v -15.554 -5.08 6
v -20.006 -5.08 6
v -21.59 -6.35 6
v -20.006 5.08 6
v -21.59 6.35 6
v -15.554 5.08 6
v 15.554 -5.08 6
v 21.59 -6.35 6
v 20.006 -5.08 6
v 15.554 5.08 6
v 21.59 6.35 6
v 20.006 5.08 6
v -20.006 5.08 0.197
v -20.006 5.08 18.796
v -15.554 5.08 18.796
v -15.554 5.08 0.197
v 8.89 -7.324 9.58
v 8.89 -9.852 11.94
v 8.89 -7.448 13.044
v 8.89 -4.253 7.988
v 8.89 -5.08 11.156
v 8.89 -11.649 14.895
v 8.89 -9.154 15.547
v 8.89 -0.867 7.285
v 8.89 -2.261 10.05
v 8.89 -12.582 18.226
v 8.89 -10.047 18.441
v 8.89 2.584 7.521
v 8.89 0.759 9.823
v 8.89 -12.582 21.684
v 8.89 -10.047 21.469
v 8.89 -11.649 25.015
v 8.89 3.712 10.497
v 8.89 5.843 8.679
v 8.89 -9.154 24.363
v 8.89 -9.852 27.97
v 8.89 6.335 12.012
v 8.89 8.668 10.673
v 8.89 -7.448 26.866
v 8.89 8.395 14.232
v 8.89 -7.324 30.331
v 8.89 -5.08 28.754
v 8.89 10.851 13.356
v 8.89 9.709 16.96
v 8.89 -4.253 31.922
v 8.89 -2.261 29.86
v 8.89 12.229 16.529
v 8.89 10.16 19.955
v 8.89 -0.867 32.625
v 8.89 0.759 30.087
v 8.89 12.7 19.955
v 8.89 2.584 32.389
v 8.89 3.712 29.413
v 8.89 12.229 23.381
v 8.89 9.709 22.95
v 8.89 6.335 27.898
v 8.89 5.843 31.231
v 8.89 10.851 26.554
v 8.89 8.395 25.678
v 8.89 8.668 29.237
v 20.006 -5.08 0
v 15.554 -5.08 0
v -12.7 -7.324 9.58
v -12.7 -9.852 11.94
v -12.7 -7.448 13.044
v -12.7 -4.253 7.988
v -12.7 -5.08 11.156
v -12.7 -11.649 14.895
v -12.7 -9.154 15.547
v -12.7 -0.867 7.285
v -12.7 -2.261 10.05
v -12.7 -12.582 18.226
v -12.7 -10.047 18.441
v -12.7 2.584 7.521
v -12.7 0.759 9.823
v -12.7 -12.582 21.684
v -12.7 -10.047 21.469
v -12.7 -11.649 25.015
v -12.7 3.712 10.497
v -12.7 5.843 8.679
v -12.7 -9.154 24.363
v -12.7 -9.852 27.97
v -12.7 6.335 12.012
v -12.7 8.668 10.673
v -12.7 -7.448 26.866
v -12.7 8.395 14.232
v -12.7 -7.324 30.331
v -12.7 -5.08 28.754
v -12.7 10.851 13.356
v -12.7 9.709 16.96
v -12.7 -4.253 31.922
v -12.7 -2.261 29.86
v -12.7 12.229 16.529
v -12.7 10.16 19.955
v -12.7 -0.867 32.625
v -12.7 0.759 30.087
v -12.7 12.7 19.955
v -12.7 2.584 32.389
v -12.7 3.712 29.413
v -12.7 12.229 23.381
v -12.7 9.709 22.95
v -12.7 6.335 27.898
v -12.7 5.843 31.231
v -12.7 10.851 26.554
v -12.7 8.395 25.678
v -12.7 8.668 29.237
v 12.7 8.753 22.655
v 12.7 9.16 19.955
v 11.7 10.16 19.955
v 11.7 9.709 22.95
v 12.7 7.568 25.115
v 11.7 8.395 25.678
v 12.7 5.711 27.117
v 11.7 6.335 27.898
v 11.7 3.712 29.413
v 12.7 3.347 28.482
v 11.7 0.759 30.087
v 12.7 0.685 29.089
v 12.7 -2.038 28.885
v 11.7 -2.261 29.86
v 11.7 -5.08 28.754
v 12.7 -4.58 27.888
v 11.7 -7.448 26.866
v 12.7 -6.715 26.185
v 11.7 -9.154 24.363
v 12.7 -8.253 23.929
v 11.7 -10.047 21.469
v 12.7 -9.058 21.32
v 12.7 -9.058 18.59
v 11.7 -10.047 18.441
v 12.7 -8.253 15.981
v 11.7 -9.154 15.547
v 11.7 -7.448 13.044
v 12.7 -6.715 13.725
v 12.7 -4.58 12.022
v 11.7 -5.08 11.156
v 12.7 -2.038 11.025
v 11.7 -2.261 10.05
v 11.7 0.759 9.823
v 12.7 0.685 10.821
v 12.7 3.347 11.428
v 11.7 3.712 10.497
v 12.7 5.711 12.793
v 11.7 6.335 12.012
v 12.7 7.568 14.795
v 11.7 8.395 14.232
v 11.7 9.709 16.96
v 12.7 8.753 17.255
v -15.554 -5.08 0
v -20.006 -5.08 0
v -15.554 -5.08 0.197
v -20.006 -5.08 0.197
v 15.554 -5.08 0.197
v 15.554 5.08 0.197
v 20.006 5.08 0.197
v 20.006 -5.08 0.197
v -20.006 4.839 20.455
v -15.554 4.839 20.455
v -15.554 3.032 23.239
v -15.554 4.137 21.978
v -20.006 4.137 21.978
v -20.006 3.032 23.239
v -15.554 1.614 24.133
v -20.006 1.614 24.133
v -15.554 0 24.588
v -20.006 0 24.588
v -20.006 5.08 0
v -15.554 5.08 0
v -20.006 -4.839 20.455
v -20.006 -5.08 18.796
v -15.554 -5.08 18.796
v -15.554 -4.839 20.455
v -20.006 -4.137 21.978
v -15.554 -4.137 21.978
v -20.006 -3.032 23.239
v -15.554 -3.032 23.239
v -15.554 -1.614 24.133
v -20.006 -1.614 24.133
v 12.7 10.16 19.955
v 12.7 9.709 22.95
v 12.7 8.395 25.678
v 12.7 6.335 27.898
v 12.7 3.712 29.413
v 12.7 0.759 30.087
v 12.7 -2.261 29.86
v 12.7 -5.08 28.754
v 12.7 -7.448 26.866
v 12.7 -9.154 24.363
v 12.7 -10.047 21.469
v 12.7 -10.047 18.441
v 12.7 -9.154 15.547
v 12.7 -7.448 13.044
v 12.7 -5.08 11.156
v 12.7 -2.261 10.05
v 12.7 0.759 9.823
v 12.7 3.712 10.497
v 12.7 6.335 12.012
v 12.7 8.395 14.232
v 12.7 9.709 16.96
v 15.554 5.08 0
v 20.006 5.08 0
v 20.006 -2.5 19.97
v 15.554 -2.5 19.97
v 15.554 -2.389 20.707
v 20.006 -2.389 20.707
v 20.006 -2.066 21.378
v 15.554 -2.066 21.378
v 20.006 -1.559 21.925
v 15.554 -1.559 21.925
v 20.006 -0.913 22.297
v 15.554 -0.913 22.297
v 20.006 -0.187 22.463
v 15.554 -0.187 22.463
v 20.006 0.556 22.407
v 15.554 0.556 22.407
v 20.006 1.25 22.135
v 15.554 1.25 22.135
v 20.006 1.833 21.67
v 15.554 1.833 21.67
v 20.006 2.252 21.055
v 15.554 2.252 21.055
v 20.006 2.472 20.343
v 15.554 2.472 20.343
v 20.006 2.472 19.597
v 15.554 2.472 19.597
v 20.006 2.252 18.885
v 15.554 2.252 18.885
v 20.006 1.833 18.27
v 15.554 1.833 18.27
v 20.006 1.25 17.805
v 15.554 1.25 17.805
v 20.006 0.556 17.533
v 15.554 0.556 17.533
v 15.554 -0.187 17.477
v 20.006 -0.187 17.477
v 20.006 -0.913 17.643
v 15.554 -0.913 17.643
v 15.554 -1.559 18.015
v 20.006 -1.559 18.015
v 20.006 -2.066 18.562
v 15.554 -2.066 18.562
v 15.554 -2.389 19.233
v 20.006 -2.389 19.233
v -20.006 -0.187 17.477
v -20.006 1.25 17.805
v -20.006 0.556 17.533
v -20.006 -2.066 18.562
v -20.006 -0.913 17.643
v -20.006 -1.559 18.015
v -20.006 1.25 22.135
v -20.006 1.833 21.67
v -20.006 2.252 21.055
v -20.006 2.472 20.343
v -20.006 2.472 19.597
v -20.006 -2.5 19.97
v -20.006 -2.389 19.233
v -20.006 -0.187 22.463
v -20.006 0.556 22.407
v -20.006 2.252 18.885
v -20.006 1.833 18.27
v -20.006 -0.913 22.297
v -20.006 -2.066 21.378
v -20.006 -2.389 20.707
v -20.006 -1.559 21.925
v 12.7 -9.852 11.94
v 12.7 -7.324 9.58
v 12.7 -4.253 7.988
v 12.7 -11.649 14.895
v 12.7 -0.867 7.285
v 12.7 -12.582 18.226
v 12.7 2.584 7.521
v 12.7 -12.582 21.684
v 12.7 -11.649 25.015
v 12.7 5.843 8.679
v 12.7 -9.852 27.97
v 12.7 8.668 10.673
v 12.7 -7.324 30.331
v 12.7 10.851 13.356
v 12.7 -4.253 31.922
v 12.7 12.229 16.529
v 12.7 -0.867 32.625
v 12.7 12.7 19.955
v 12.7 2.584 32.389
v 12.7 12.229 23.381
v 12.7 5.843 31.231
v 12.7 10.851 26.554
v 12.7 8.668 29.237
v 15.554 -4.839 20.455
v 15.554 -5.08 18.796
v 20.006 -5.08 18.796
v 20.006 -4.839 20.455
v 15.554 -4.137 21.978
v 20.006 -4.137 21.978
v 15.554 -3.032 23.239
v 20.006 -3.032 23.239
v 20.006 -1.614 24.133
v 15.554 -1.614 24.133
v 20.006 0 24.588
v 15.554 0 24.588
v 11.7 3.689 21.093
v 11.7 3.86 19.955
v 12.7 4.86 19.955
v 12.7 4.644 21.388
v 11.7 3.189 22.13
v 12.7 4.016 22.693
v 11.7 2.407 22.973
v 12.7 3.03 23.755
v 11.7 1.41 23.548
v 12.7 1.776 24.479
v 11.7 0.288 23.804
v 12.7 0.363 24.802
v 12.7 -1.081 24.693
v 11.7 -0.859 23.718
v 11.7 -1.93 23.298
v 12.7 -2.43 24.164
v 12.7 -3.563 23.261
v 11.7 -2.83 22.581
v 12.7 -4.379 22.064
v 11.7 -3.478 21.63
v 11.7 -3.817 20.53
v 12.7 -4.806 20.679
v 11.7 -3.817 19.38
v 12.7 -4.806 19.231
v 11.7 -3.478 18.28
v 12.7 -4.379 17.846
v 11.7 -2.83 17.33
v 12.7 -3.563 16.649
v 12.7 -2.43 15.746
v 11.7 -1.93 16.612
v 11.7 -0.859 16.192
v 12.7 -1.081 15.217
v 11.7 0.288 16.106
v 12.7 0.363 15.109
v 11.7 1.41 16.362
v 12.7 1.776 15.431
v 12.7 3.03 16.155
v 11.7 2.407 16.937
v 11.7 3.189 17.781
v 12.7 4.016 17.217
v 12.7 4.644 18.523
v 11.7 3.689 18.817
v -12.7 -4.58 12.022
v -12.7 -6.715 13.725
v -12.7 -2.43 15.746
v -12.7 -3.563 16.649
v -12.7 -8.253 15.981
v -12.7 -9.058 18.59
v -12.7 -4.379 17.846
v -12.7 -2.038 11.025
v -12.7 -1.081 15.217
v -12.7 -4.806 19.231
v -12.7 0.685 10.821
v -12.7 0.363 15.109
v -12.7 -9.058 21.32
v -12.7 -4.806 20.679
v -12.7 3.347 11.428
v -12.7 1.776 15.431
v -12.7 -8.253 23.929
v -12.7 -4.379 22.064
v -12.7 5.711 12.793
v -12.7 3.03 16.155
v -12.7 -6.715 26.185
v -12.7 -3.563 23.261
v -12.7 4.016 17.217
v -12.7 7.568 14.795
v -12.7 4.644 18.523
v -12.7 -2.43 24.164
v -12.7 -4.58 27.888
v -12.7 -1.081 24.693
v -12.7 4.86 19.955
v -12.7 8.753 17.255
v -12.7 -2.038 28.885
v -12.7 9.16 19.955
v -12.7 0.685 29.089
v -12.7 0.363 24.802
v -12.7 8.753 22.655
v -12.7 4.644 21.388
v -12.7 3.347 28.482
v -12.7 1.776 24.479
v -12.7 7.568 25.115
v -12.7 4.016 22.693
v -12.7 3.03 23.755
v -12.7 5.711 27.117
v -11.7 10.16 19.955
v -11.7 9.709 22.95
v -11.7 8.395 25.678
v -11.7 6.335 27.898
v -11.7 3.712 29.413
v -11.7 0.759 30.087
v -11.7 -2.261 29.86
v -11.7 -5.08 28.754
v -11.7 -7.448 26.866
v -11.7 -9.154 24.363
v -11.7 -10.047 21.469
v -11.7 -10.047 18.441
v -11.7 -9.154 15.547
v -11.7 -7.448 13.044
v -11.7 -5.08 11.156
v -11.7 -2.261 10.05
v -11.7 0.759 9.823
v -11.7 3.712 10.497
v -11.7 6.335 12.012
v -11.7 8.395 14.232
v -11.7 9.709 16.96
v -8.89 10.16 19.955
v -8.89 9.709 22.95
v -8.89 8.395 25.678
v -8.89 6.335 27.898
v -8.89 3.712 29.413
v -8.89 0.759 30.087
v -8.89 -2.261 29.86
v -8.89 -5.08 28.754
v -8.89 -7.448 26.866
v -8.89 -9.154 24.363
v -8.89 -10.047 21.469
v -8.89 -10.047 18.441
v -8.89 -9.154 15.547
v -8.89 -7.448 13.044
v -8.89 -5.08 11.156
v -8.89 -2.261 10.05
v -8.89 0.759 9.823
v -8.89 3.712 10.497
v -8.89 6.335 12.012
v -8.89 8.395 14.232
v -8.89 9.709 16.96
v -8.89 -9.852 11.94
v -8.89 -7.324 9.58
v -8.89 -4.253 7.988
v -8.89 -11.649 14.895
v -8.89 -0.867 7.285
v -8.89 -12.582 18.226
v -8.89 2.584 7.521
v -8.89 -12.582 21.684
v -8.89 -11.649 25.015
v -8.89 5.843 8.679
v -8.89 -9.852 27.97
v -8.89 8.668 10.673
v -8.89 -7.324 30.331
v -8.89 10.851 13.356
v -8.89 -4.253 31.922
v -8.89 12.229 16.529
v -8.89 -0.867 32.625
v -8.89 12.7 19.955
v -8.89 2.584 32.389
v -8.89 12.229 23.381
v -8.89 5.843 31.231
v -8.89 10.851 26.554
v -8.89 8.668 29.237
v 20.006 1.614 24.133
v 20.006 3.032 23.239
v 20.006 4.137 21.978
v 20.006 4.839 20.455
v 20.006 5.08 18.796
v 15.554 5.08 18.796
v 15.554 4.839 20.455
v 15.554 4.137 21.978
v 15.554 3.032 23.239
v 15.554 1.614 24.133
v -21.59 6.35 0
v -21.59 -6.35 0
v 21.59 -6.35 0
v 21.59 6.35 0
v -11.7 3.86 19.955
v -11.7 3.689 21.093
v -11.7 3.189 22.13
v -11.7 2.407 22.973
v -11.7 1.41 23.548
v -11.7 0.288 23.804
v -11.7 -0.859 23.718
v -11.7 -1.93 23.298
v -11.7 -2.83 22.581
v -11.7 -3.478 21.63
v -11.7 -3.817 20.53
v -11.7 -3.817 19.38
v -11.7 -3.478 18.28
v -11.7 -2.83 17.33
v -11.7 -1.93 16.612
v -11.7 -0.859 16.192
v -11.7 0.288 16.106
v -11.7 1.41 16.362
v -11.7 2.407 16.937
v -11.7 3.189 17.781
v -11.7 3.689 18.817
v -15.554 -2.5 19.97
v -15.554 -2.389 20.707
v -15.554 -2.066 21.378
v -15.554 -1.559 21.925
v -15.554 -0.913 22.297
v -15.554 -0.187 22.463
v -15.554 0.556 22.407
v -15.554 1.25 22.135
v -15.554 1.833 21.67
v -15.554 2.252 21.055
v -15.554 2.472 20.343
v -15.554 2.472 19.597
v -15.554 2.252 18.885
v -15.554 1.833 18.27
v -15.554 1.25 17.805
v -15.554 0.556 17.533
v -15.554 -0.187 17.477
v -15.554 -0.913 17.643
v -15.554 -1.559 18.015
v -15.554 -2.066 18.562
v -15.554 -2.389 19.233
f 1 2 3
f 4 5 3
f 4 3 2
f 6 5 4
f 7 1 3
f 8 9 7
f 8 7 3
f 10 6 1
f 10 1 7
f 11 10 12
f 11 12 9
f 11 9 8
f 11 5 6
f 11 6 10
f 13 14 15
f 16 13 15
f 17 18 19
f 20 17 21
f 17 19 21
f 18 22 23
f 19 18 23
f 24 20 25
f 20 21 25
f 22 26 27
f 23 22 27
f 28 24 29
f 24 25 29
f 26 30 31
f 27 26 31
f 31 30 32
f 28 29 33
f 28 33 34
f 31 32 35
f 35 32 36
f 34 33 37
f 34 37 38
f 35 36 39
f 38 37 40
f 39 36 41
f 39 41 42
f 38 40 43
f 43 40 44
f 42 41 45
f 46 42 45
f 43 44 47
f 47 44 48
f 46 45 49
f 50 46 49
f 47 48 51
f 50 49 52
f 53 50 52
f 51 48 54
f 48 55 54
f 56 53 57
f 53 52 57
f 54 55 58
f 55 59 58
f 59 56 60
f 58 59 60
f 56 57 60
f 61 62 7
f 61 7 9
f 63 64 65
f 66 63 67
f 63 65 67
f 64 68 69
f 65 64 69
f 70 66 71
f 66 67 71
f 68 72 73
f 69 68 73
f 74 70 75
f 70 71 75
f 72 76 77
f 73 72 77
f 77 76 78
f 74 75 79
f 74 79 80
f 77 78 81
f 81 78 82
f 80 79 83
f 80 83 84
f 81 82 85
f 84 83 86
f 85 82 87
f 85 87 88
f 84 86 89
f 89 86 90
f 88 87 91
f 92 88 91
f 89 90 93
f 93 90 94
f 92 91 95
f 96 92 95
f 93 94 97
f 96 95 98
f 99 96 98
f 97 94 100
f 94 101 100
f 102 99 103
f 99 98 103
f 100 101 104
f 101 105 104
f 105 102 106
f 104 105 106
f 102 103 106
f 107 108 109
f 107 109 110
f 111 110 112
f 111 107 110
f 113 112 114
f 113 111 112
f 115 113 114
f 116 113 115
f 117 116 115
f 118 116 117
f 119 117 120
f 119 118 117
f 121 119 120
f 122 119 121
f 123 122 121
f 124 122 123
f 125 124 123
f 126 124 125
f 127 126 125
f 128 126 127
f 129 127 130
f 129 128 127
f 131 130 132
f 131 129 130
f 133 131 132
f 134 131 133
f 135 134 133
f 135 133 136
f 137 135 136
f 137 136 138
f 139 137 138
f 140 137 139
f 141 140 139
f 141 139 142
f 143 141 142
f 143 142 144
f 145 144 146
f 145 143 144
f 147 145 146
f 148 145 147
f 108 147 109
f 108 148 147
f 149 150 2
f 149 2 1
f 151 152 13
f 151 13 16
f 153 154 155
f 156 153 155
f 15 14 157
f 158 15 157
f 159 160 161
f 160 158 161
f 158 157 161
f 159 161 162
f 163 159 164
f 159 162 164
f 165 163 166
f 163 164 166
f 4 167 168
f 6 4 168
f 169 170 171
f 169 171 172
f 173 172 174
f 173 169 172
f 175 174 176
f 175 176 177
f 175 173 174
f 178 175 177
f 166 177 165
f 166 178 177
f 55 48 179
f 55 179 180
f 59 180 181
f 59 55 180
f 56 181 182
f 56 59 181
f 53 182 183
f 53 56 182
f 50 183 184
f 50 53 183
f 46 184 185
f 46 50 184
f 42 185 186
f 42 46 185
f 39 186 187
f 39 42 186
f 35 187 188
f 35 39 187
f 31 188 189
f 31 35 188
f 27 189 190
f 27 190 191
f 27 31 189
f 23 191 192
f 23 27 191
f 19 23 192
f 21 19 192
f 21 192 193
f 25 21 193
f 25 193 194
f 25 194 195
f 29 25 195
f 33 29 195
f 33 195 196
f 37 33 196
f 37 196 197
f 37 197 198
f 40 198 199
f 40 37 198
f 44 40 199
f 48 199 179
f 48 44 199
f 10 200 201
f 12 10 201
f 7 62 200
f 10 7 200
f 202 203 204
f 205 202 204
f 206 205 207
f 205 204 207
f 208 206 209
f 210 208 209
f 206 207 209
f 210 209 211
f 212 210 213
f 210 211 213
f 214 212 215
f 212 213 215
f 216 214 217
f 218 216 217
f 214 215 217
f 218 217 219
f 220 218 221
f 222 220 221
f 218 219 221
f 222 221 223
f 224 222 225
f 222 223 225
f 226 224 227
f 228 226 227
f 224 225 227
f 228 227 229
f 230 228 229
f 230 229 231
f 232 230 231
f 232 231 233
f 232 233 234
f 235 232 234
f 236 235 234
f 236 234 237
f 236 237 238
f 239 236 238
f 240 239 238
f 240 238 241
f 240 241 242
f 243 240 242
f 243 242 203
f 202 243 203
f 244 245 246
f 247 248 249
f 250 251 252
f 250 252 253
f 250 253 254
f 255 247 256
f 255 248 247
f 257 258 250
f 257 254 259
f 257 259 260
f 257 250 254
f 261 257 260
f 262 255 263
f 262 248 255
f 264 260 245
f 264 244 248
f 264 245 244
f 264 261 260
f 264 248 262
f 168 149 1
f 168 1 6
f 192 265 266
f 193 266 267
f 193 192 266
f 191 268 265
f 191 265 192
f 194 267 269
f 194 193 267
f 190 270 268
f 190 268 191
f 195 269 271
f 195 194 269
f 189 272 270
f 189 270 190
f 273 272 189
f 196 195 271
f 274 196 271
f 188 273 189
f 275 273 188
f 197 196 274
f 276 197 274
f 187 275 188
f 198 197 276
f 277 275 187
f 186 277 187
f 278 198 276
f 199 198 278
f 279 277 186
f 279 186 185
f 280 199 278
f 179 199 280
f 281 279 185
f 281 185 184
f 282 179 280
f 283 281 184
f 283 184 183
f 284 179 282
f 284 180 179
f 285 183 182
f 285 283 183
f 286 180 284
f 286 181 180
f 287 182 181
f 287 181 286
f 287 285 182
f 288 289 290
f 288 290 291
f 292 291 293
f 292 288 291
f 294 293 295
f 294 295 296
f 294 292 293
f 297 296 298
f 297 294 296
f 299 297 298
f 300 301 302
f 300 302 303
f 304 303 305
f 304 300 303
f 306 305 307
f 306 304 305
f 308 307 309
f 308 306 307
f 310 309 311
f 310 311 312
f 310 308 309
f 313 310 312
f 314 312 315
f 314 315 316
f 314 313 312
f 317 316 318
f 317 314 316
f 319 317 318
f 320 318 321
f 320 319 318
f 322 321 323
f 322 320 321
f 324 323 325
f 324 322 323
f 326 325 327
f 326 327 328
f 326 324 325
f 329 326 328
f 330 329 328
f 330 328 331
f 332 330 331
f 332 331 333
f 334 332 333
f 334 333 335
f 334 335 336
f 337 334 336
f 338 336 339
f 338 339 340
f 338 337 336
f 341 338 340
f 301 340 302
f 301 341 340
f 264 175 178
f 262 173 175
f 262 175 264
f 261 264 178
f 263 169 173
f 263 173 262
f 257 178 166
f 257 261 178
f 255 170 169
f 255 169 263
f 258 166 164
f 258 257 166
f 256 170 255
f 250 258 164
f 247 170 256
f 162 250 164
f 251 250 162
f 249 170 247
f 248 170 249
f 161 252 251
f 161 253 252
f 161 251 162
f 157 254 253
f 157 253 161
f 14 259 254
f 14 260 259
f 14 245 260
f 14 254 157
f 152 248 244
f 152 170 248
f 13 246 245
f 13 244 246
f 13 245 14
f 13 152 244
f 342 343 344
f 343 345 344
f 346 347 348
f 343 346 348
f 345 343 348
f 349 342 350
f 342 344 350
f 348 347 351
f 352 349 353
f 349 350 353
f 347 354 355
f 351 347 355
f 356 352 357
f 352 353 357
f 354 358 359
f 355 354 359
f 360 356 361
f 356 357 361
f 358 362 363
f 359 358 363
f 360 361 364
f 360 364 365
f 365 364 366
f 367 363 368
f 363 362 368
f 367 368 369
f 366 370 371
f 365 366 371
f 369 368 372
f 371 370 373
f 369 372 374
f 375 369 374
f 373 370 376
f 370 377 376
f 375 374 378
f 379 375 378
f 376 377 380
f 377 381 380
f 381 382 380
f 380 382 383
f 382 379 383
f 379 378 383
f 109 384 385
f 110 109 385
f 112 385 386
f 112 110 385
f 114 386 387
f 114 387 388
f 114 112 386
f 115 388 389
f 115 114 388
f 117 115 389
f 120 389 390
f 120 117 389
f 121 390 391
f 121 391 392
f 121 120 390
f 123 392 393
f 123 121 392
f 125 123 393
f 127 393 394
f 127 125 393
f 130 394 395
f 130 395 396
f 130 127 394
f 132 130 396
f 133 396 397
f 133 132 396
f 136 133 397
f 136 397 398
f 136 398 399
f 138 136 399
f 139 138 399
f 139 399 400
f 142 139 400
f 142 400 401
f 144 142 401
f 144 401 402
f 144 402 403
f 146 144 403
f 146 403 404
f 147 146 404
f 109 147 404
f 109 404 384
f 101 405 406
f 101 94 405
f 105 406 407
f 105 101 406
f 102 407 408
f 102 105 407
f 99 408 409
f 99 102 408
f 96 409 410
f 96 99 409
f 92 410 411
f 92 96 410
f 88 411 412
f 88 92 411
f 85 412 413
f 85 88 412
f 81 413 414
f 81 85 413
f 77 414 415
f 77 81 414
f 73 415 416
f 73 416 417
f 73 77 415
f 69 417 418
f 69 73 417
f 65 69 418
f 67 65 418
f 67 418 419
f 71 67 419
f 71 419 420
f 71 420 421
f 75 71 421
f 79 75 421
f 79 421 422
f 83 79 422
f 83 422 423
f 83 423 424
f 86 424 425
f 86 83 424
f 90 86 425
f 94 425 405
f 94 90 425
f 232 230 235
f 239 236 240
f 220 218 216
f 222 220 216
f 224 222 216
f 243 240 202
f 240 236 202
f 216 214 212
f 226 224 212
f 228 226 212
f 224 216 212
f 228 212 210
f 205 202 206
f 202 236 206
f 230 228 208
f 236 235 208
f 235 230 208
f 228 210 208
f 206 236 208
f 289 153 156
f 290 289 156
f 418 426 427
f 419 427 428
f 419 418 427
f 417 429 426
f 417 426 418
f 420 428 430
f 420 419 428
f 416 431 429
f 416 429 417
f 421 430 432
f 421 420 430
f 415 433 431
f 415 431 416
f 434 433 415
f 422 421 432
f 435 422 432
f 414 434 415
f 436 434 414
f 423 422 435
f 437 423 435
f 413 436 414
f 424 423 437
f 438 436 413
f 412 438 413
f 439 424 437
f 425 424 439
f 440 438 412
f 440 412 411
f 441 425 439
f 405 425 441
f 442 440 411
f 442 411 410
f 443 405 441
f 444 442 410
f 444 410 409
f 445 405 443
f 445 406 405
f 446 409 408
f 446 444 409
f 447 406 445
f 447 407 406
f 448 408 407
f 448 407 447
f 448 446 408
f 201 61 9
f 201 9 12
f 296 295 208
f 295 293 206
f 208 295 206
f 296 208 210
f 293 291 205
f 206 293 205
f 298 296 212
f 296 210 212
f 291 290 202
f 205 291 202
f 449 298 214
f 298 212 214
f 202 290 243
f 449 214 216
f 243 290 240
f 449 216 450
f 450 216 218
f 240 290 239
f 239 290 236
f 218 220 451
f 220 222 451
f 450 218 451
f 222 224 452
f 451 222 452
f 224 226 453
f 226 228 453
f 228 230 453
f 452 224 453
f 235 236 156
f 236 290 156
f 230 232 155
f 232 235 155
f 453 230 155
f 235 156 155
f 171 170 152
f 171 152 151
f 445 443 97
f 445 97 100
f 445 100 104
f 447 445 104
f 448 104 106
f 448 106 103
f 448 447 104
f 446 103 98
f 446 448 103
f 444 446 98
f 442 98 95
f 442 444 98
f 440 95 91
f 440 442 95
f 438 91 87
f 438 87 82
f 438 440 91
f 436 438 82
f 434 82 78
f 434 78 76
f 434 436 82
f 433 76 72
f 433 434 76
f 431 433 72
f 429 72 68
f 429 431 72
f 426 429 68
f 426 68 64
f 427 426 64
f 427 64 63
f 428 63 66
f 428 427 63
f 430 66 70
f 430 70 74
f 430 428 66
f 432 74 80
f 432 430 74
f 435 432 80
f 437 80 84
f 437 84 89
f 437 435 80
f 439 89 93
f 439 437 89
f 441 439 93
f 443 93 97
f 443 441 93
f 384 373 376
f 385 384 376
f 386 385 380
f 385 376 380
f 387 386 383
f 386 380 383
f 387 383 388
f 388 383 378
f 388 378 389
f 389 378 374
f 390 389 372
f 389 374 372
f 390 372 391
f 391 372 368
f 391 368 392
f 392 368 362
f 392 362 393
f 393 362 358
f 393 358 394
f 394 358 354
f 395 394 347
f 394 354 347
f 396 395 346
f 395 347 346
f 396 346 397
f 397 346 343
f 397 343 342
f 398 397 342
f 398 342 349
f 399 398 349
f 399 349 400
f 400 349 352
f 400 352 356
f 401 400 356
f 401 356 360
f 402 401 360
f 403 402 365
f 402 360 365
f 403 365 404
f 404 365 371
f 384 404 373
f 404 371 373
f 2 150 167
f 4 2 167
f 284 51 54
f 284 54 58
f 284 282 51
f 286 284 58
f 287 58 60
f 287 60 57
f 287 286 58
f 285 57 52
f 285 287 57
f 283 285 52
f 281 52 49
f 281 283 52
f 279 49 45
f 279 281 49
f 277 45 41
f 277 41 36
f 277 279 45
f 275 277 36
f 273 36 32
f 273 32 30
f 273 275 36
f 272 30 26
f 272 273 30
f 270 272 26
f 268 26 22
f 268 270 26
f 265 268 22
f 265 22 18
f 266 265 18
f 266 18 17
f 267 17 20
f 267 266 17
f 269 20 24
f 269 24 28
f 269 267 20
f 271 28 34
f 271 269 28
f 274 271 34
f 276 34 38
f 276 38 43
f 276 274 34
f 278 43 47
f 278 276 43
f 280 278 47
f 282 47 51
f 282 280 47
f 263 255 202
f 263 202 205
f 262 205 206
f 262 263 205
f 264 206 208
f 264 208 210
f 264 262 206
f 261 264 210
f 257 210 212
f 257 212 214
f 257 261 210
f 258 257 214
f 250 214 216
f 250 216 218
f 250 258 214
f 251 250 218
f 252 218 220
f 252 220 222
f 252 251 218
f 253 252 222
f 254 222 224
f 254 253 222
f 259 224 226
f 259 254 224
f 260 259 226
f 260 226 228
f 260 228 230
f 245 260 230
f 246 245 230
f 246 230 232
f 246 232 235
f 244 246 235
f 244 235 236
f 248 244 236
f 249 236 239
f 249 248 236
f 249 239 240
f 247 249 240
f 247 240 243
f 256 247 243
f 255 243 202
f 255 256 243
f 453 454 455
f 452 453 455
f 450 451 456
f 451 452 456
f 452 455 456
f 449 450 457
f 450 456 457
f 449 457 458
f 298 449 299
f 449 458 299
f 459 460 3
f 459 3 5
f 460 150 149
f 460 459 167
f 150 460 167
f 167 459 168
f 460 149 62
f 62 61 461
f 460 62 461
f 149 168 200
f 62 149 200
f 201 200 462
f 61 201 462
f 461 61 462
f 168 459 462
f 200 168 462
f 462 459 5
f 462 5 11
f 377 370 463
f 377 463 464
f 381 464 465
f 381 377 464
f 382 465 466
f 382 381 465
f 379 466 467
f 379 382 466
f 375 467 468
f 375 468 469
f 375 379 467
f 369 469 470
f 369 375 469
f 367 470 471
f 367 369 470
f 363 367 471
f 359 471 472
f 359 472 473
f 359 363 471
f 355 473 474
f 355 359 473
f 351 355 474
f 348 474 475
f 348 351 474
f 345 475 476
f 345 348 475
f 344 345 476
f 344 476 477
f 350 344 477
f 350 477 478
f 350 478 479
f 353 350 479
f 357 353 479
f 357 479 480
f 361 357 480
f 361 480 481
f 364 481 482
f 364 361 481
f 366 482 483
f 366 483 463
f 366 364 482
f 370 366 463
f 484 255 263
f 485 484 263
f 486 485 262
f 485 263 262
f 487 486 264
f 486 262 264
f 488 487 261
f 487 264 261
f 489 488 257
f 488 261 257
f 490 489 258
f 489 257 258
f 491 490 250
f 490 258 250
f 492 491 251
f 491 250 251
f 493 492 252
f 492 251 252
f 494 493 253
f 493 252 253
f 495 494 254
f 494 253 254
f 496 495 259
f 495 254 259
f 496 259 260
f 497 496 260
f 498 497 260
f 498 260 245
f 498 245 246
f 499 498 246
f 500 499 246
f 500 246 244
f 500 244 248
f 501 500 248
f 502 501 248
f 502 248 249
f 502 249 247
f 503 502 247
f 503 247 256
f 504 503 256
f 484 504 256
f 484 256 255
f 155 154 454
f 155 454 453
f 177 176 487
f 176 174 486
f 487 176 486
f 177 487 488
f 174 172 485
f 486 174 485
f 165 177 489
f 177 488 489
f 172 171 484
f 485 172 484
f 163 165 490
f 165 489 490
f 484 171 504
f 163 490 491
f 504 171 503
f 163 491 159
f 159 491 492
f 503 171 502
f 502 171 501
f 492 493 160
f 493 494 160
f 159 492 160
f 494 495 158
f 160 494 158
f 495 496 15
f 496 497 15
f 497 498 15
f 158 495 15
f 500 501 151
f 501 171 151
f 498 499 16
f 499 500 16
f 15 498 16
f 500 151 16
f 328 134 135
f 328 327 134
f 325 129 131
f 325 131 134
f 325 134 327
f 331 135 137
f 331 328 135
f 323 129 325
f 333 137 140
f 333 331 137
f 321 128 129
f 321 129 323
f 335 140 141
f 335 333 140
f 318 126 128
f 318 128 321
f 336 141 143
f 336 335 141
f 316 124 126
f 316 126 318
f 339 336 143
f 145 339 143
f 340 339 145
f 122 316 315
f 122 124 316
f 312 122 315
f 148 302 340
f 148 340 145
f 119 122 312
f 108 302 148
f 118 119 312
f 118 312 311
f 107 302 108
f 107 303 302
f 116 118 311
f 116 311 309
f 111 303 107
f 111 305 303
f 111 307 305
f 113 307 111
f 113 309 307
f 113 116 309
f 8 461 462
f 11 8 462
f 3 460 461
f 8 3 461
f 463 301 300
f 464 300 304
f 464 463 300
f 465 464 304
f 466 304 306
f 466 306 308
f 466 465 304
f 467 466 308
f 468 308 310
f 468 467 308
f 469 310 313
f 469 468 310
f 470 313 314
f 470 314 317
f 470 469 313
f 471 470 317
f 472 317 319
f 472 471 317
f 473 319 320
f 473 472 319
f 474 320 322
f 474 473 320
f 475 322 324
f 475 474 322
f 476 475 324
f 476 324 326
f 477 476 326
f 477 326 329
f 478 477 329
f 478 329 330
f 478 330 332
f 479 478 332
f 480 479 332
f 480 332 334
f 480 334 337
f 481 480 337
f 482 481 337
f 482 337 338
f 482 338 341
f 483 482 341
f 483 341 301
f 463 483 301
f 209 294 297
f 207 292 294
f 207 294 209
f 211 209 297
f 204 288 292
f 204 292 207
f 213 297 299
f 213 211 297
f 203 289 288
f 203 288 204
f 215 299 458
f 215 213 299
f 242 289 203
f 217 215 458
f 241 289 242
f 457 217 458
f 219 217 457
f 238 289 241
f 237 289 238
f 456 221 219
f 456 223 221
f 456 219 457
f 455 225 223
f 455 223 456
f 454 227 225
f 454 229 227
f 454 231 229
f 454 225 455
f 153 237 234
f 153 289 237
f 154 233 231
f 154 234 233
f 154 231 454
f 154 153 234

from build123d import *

# Parameters (mm, degrees)
F0_W          = 43.18
F0_H          = 12.7
F0_W_2        = 4.4527295977
F0_H_2        = 10.16
F0_W_3        = 4.4527407736
F1_DEPTH      = 6
F2_START      = 0.19698
F2_DEPTH      = 24.44102
F3_T1_DEPTH   = 33.6627407736
F3_2_T1_DEPTH = 33.6627295977
F4_R          = 2.5
F5_DEPTH      = 40.0127351856
F6_DEPTH      = 40.0127351856
F7_R          = 12.7
F7_R_2        = 10.16
F8_DEPTH      = 12.7
F7_R_3        = 3.8600941061
F9_DEPTH      = 12.7
F10_DEPTH     = 8.89
F11_SIZE      = 1


# Not quite as in the source:
# - a fillet or chamfer that OpenCascade refuses, or shapes differently, is made with other operations: its cross-section is extruded or revolved along the edge and cut away or added


with BuildPart() as f1:
    # F0 (on Top) → F1 (new body)
    with BuildSketch(Plane.XY):
        Rectangle(F0_W, F0_H)
        with Locations((-17.78, 0)):
            Rectangle(F0_W_2, F0_H_2, mode=Mode.SUBTRACT)
        with Locations((17.78, 0)):
            Rectangle(F0_W_3, F0_H_2, mode=Mode.SUBTRACT)
    extrude(amount=F1_DEPTH)


with BuildPart() as f2:
    # F0 (on Top) → F2 (new body)
    with BuildSketch(Plane.XY.offset(F2_START)):
        with Locations((-17.78, 0)):
            Rectangle(F0_W_2, F0_H_2)
    extrude(amount=F2_DEPTH)

    # F3#2: fillet of radius 5.842 on 2 edges, made by hand

    # F3_2_s2 → F3_2_t1 (cut)
    with BuildSketch(Plane.YZ.offset(-34.6113647988)):
        with BuildLine():
            ThreePointArc((5.08, 18.796), (3.3689178157, 22.9269178157), (-0.762, 24.638))
            Line((-0.762, 24.638), (5.08, 24.638))
            Line((5.08, 24.638), (5.08, 18.796))
        make_face()
        with BuildLine():
            ThreePointArc((-5.08, 18.796), (-3.3689178157, 22.9269178157), (0.762, 24.638))
            Line((0.762, 24.638), (-5.08, 24.638))
            Line((-5.08, 24.638), (-5.08, 18.796))
        make_face()
    extrude(amount=F3_2_T1_DEPTH, mode=Mode.SUBTRACT)


with BuildPart() as f2b:
    # F0 (on Top) → F2, piece 2 (new body)
    with BuildSketch(Plane.XY.offset(F2_START)):
        with Locations((17.78, 0)):
            Rectangle(F0_W_3, F0_H_2)
    extrude(amount=F2_DEPTH)

    # F3: fillet of radius 5.842 on 2 edges, made by hand

    # F3_s2 → F3_t1 (cut)
    with BuildSketch(Plane.YZ.offset(0.9486296132)):
        with BuildLine():
            ThreePointArc((5.08, 18.796), (3.3689178157, 22.9269178157), (-0.762, 24.638))
            Line((-0.762, 24.638), (5.08, 24.638))
            Line((5.08, 24.638), (5.08, 18.796))
        make_face()
        with BuildLine():
            ThreePointArc((-5.08, 18.796), (-3.3689178157, 22.9269178157), (0.762, 24.638))
            Line((0.762, 24.638), (-5.08, 24.638))
            Line((-5.08, 24.638), (-5.08, 18.796))
        make_face()
    extrude(amount=F3_T1_DEPTH, mode=Mode.SUBTRACT)


with BuildPart() as f5_tool:
    # F4 (on face) → F5 (new body, through all)
    with BuildSketch(Plane(origin=(-20.0063647988, 0, 0), x_dir=(0, -1, 0), z_dir=(-1, 0, 0))):
        with Locations((0, 19.97)):
            Circle(F4_R)
    extrude(amount=-F5_DEPTH)


with BuildPart() as f2_1:
    add(f2.part)

    # F5: cut by f5_tool
    add(f5_tool.part, mode=Mode.SUBTRACT)


with BuildPart() as f2b_1:
    add(f2b.part)

    # F5: cut by f5_tool
    add(f5_tool.part, mode=Mode.SUBTRACT)


with BuildPart() as f6:
    # F4 (on face) → F6 (new body, through all)
    with BuildSketch(Plane(origin=(-20.0063647988, 0, 0), x_dir=(0, -1, 0), z_dir=(-1, 0, 0))):
        with Locations((0, 19.97)):
            Circle(F4_R)
    extrude(amount=-F6_DEPTH)


with BuildPart() as f8:
    # F7 (on Right) → F8 (new body, symmetric)
    with BuildSketch(Plane.YZ):
        with Locations((0, 19.9550520629)):
            Circle(F7_R)
        with Locations((0, 19.9550520629)):
            Circle(F7_R_2, mode=Mode.SUBTRACT)
    extrude(amount=F8_DEPTH, both=True)

    # F7 (on Right) → F10 (cut, symmetric)
    with BuildSketch(Plane.YZ):
        with Locations((0, 19.9550520629)):
            Circle(F7_R)
        with Locations((0, 19.9550520629)):
            Circle(F7_R_2, mode=Mode.SUBTRACT)
    extrude(amount=F10_DEPTH, both=True, mode=Mode.SUBTRACT)


with BuildPart() as f9:
    # F7 (on Right) → F9 (new body, symmetric)
    with BuildSketch(Plane.YZ):
        with Locations((0, 19.9550520629)):
            Circle(F7_R_2)
        with Locations((0, 19.9550520629)):
            Circle(F7_R_3, mode=Mode.SUBTRACT)
    extrude(amount=F9_DEPTH, both=True)

    # F11
    f11_edges = [f9.edges().sort_by_distance(p)[0] for p in [
        (12.7, -3.860094, 19.955052),
        (-12.7, -3.860094, 19.955052),
        (12.7, -10.16, 19.955052),
        (-12.7, -10.16, 19.955052),
        (0, 10.16, 19.955052),
    ]]
    chamfer(f11_edges, length=F11_SIZE)


solid = Compound([f1.part, f2_1.part, f2b_1.part, f6.part, f8.part, f9.part])
